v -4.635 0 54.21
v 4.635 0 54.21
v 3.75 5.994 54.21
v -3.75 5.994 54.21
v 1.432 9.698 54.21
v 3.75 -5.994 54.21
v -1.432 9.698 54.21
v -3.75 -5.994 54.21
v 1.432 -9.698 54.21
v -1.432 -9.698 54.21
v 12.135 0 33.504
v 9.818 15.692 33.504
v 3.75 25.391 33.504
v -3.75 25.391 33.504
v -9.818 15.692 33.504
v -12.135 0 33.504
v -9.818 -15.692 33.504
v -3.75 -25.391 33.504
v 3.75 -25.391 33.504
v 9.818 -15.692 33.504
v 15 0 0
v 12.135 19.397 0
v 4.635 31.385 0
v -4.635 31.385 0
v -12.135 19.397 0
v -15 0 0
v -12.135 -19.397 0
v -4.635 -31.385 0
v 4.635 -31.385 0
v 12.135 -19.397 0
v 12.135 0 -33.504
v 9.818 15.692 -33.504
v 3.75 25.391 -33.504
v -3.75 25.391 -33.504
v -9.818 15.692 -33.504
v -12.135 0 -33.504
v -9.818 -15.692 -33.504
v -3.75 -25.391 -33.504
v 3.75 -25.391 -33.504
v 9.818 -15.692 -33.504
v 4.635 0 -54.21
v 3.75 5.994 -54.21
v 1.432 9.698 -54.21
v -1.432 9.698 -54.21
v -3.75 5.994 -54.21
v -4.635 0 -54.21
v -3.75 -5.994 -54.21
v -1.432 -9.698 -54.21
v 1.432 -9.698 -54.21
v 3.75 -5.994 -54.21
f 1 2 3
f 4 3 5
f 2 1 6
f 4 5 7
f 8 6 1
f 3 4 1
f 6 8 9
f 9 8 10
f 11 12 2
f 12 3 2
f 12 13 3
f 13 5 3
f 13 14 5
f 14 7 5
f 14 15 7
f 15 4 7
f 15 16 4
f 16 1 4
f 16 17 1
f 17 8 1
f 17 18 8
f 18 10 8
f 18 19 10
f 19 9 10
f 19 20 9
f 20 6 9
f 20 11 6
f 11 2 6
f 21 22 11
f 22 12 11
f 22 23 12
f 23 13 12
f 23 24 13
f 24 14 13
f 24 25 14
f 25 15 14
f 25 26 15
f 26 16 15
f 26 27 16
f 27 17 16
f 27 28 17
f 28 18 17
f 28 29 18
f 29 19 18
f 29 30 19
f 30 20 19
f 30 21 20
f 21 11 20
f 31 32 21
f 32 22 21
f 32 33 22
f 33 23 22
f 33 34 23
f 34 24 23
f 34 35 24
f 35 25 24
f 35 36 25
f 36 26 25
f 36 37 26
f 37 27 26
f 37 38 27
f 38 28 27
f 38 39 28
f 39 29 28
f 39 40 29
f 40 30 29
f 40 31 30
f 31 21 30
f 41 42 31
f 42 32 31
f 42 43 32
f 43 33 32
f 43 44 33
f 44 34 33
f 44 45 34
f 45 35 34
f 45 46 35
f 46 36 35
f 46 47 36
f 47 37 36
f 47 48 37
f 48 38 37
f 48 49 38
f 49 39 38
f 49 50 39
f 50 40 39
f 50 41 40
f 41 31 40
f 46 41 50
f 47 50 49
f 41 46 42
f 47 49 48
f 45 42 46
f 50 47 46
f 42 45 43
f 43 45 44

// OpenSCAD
// Generated by SolidPython 1.0.1 on 2020-07-29 00:46:46


scale(v = [5, 11, 19]) {
	sphere(r = 3);
}
/***********************************************
*********      SolidPython code:      **********
************************************************
 
# import packages: SolidPython
from solid import *
from solid.utils import *
from itertools import chain, combinations, permutations


class Resize:

    def __init__(self, scad_file):
        self.scad_file = scad_file
        #self.scad_file = import_scad(scad_file)
        # cone/cylinder param:
        self.r1 = 0
        self.r2 = 0
        self.h = 0
        # rectangular prism param:
        self.w = 0
        self.l = 0
        # ellipse param:
        self.r = 0

    # import OpenScad code (file name corresponds to shape)


    # classify shape + parameters
    def assign(self, param1, param2, param3):
        if self.scad_file == 'cone.scad':
            self.r1 = param1
            self.r2 = param2
            self.h = param3
        elif self.scad_file == 'cylinder.scad':
            self.r1 = param1
            self.r2 = param2
            self.h = param3
        elif self.scad_file == 'rectangularPrism.scad':
            self.h = param1
            self.l = param2
            self.w = param3
        else:
            self.r = param1
            self.h = param2

    # resize parameters
    def iterate(self):
        x = range(3, 20, 2)
        i = 1
        if self.scad_file == 'cone.scad':
            tempList = list(permutations(x, 2))
            for temp in tempList:
                param1 = temp[0]
                param2 = temp[1]
                filepath = 'produced_scad_files/' + 'cone' + str(param1) + '_' + str(param2) + '_' + '.scad'
                scad_render_to_file(cylinder(h=param1, r1=param2, r2=0), filepath)

        elif self.scad_file == 'cylinder.scad':
            tempList = list(permutations(x, 3))
            for temp in tempList:
                param1 = temp[0]
                param2 = temp[1]
                filepath = 'produced_scad_files/' + 'cylinder' + str(param1) + '_' + str(param2) + '_' + '.scad'
                scad_render_to_file(cylinder(h=param1, r1=param2, r2=param2), filepath)

        elif self.scad_file == 'rectangularPrism.scad':
            tempList = list(permutations(x, 3))
            for temp in tempList:
                param1 = temp[0]
                param2 = temp[1]
                param3 = temp[2]
                filepath = 'produced_scad_files/' + 'rectangularPrism' + str(param1) + '_' + str(param2) + '_' + str(
                    param3) + '.scad'
                scad_render_to_file(cube(size=(param1, param2, param3)), filepath)

        elif self.scad_file == 'ellipse.scad':
            tempList = list(permutations(x, 4))
            for temp in tempList:
                param1 = temp[0]
                param2 = temp[1]
                param3 = temp[2]
                param4 = temp[3]
                filepath = 'produced_scad_files/' + 'ellipse' + str(param1) + '_' + str(param2) + '_' + str(param3) + '_' + str(param4) + '.scad'
                scad_render_to_file(scale([param1, param2, param3])(sphere(r=param4)), filepath)

    def render_to_scadfile(self):
        scad_render_to_file(scad, 'example.scad') 
 
************************************************/
